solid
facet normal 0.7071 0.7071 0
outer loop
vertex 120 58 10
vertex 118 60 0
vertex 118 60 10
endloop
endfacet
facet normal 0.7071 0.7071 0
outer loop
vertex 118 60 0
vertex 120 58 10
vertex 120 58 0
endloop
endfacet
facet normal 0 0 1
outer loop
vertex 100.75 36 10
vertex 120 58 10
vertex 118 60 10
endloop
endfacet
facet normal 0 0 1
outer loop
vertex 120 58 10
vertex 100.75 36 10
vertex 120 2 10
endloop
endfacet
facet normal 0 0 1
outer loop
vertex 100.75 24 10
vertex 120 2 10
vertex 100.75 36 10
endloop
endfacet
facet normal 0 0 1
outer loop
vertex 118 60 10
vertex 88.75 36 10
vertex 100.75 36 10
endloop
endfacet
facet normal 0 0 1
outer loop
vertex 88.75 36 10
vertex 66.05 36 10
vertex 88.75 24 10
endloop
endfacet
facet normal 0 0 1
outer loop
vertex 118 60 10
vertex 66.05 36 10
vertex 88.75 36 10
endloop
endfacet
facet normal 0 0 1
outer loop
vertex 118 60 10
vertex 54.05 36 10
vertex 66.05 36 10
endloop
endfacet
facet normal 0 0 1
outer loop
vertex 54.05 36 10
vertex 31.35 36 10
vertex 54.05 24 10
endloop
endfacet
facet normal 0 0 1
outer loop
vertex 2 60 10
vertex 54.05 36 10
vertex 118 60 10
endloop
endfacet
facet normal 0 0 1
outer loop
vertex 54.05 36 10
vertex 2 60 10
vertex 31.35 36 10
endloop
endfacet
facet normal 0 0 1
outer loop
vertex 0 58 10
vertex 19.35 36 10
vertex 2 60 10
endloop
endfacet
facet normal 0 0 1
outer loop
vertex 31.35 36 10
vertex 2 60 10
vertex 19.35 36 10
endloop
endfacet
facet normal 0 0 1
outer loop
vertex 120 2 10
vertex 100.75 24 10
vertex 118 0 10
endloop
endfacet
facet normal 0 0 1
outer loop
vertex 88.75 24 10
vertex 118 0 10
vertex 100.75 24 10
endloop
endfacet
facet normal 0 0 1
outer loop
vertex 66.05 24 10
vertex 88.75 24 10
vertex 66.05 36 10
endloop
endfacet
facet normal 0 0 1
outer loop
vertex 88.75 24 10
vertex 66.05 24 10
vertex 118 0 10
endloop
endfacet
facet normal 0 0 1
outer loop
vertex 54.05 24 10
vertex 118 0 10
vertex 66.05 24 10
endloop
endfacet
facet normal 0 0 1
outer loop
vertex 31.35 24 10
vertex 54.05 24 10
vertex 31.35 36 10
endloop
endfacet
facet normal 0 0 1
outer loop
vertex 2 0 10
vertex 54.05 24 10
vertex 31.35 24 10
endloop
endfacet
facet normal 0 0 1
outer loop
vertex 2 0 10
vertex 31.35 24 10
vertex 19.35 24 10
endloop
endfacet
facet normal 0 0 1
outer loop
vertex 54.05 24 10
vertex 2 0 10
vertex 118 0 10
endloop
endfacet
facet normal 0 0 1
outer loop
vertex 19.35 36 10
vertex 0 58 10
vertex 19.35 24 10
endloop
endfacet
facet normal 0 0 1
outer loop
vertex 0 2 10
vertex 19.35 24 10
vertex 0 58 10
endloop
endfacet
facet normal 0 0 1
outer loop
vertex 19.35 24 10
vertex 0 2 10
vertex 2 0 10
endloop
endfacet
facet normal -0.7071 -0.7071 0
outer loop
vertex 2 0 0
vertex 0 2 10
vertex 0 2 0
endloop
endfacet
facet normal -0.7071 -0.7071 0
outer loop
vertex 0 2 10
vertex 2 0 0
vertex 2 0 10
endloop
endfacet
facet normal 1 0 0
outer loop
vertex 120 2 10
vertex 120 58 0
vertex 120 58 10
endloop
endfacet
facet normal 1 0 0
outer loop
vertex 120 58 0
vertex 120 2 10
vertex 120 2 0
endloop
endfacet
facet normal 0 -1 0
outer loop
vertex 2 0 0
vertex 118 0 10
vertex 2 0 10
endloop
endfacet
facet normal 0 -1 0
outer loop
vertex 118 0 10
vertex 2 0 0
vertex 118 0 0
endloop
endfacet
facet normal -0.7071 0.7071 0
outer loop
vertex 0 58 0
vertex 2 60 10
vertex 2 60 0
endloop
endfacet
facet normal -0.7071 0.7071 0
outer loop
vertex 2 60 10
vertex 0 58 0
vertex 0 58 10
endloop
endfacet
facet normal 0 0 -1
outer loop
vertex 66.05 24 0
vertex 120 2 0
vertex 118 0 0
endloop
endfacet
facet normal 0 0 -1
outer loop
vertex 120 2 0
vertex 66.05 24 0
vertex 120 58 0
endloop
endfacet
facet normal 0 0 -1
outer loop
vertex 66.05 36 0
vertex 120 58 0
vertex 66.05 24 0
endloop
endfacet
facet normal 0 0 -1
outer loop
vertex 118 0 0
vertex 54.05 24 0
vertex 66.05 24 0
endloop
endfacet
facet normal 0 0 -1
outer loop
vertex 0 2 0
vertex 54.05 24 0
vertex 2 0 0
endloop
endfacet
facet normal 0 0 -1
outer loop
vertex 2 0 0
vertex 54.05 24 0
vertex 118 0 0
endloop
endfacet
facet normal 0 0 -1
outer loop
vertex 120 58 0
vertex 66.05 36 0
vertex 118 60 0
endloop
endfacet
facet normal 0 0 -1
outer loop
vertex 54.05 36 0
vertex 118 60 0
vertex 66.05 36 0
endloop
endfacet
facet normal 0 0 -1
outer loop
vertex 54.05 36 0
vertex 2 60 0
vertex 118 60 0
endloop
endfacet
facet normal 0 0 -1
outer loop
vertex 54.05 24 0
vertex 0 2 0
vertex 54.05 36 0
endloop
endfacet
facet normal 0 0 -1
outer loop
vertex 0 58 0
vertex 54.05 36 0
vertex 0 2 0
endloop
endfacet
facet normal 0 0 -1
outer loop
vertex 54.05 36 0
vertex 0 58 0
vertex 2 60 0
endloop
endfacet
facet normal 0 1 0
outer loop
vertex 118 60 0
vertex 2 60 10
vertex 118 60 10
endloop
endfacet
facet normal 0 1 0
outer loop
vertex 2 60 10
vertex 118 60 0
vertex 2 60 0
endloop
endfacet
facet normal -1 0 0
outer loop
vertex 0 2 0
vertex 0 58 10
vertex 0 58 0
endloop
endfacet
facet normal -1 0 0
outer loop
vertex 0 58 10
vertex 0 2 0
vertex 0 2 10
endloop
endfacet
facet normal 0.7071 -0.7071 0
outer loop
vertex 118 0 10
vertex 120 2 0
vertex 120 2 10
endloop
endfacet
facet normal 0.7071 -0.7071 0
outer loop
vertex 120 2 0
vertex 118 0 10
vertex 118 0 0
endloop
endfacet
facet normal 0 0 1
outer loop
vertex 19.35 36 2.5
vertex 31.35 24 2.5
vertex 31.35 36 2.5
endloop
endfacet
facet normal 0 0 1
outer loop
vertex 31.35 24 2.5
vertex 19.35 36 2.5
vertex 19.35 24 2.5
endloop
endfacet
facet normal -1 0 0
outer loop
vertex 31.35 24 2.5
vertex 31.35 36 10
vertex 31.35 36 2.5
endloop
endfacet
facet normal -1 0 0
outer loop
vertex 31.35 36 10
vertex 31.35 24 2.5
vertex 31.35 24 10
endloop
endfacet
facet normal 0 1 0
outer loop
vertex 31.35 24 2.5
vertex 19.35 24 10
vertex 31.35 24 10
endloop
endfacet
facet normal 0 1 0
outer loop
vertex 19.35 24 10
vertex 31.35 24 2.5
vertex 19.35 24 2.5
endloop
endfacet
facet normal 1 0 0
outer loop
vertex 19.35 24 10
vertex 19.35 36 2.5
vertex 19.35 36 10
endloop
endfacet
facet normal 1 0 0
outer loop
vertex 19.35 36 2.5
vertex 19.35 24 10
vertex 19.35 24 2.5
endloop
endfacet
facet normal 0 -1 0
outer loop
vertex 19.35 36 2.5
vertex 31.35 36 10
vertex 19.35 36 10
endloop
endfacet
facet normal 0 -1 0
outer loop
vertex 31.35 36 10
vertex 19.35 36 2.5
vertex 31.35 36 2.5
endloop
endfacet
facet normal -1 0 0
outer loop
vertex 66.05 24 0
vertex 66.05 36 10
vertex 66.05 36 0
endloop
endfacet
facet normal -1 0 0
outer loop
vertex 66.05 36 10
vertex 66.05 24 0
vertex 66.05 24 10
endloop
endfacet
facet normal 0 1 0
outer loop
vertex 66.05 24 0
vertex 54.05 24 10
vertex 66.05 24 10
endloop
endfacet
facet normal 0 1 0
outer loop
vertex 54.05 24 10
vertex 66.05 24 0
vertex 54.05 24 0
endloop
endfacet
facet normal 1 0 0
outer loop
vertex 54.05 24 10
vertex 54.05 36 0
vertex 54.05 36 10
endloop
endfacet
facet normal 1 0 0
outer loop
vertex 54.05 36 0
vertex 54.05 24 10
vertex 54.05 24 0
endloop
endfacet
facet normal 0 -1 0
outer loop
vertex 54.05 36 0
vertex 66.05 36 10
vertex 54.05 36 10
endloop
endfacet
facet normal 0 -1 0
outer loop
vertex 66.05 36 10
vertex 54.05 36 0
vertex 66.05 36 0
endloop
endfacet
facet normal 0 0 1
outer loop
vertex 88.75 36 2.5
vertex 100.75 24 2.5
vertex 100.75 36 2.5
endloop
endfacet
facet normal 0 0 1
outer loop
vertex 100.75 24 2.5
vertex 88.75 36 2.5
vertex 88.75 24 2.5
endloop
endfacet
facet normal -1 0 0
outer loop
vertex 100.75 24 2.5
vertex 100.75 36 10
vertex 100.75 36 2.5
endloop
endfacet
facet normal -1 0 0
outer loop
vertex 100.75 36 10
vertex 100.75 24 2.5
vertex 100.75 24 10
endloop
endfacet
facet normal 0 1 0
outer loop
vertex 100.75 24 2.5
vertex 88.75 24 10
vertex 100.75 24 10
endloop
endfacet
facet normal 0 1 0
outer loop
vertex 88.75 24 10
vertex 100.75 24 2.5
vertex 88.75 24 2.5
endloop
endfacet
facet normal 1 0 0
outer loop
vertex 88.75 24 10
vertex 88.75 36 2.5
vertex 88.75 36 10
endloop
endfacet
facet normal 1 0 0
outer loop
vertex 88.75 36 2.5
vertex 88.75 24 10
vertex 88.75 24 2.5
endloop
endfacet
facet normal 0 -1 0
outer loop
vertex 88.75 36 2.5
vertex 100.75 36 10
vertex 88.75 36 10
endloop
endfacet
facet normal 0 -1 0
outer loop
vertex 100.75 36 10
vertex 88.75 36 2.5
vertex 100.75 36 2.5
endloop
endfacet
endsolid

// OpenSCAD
$fn = 32;

// ----------------------------------------------------------------------
// Windowed plate: 3 voids, 120 x 60 x 10 mm
// ----------------------------------------------------------------------

// --- parameters (mm) ---
plate_l = 120;            // plate length, X
plate_w = 60;             // plate width, Y
plate_t = 10;             // plate thickness, Z
edge_margin = 8;          // wall from the plate edge to any window
windows = 3;              // number of windows in the row
win_l = 12;               // window length
win_w = 12;               // window width
win_pitch = 34.7;         // window pitch along X
depth_1 = 7.5;            // depth of void 1 (full thickness = through)
depth_2 = 10;             // depth of void 2 (full thickness = through)
depth_3 = 7.5;            // depth of void 3 (full thickness = through)
corner_c = 2;             // corner chamfer of the plate

profile = [[2, 0], [118, 0], [120, 2], [120, 58], [118, 60], [2, 60], [0, 58], [0, 2]];  // primary outline, 8 points, counter clockwise
void_1 = [[19.35, 24], [31.35, 24], [31.35, 36], [19.35, 36]];  // window 1 of the row, 4 points
void_2 = [[54.05, 24], [66.05, 24], [66.05, 36], [54.05, 36]];  // window 2 of the row, 4 points
void_3 = [[88.75, 24], [100.75, 24], [100.75, 36], [88.75, 36]];  // window 3 of the row, 4 points

// --- the one profile operation ---
difference() {
  linear_extrude(height = plate_t) polygon(points = profile);
  translate([0, 0, plate_t - depth_1])
    linear_extrude(height = depth_1 + 1) polygon(points = void_1);
  translate([0, 0, -1])
    linear_extrude(height = plate_t + 2) polygon(points = void_2);
  translate([0, 0, plate_t - depth_3])
    linear_extrude(height = depth_3 + 1) polygon(points = void_3);
}
